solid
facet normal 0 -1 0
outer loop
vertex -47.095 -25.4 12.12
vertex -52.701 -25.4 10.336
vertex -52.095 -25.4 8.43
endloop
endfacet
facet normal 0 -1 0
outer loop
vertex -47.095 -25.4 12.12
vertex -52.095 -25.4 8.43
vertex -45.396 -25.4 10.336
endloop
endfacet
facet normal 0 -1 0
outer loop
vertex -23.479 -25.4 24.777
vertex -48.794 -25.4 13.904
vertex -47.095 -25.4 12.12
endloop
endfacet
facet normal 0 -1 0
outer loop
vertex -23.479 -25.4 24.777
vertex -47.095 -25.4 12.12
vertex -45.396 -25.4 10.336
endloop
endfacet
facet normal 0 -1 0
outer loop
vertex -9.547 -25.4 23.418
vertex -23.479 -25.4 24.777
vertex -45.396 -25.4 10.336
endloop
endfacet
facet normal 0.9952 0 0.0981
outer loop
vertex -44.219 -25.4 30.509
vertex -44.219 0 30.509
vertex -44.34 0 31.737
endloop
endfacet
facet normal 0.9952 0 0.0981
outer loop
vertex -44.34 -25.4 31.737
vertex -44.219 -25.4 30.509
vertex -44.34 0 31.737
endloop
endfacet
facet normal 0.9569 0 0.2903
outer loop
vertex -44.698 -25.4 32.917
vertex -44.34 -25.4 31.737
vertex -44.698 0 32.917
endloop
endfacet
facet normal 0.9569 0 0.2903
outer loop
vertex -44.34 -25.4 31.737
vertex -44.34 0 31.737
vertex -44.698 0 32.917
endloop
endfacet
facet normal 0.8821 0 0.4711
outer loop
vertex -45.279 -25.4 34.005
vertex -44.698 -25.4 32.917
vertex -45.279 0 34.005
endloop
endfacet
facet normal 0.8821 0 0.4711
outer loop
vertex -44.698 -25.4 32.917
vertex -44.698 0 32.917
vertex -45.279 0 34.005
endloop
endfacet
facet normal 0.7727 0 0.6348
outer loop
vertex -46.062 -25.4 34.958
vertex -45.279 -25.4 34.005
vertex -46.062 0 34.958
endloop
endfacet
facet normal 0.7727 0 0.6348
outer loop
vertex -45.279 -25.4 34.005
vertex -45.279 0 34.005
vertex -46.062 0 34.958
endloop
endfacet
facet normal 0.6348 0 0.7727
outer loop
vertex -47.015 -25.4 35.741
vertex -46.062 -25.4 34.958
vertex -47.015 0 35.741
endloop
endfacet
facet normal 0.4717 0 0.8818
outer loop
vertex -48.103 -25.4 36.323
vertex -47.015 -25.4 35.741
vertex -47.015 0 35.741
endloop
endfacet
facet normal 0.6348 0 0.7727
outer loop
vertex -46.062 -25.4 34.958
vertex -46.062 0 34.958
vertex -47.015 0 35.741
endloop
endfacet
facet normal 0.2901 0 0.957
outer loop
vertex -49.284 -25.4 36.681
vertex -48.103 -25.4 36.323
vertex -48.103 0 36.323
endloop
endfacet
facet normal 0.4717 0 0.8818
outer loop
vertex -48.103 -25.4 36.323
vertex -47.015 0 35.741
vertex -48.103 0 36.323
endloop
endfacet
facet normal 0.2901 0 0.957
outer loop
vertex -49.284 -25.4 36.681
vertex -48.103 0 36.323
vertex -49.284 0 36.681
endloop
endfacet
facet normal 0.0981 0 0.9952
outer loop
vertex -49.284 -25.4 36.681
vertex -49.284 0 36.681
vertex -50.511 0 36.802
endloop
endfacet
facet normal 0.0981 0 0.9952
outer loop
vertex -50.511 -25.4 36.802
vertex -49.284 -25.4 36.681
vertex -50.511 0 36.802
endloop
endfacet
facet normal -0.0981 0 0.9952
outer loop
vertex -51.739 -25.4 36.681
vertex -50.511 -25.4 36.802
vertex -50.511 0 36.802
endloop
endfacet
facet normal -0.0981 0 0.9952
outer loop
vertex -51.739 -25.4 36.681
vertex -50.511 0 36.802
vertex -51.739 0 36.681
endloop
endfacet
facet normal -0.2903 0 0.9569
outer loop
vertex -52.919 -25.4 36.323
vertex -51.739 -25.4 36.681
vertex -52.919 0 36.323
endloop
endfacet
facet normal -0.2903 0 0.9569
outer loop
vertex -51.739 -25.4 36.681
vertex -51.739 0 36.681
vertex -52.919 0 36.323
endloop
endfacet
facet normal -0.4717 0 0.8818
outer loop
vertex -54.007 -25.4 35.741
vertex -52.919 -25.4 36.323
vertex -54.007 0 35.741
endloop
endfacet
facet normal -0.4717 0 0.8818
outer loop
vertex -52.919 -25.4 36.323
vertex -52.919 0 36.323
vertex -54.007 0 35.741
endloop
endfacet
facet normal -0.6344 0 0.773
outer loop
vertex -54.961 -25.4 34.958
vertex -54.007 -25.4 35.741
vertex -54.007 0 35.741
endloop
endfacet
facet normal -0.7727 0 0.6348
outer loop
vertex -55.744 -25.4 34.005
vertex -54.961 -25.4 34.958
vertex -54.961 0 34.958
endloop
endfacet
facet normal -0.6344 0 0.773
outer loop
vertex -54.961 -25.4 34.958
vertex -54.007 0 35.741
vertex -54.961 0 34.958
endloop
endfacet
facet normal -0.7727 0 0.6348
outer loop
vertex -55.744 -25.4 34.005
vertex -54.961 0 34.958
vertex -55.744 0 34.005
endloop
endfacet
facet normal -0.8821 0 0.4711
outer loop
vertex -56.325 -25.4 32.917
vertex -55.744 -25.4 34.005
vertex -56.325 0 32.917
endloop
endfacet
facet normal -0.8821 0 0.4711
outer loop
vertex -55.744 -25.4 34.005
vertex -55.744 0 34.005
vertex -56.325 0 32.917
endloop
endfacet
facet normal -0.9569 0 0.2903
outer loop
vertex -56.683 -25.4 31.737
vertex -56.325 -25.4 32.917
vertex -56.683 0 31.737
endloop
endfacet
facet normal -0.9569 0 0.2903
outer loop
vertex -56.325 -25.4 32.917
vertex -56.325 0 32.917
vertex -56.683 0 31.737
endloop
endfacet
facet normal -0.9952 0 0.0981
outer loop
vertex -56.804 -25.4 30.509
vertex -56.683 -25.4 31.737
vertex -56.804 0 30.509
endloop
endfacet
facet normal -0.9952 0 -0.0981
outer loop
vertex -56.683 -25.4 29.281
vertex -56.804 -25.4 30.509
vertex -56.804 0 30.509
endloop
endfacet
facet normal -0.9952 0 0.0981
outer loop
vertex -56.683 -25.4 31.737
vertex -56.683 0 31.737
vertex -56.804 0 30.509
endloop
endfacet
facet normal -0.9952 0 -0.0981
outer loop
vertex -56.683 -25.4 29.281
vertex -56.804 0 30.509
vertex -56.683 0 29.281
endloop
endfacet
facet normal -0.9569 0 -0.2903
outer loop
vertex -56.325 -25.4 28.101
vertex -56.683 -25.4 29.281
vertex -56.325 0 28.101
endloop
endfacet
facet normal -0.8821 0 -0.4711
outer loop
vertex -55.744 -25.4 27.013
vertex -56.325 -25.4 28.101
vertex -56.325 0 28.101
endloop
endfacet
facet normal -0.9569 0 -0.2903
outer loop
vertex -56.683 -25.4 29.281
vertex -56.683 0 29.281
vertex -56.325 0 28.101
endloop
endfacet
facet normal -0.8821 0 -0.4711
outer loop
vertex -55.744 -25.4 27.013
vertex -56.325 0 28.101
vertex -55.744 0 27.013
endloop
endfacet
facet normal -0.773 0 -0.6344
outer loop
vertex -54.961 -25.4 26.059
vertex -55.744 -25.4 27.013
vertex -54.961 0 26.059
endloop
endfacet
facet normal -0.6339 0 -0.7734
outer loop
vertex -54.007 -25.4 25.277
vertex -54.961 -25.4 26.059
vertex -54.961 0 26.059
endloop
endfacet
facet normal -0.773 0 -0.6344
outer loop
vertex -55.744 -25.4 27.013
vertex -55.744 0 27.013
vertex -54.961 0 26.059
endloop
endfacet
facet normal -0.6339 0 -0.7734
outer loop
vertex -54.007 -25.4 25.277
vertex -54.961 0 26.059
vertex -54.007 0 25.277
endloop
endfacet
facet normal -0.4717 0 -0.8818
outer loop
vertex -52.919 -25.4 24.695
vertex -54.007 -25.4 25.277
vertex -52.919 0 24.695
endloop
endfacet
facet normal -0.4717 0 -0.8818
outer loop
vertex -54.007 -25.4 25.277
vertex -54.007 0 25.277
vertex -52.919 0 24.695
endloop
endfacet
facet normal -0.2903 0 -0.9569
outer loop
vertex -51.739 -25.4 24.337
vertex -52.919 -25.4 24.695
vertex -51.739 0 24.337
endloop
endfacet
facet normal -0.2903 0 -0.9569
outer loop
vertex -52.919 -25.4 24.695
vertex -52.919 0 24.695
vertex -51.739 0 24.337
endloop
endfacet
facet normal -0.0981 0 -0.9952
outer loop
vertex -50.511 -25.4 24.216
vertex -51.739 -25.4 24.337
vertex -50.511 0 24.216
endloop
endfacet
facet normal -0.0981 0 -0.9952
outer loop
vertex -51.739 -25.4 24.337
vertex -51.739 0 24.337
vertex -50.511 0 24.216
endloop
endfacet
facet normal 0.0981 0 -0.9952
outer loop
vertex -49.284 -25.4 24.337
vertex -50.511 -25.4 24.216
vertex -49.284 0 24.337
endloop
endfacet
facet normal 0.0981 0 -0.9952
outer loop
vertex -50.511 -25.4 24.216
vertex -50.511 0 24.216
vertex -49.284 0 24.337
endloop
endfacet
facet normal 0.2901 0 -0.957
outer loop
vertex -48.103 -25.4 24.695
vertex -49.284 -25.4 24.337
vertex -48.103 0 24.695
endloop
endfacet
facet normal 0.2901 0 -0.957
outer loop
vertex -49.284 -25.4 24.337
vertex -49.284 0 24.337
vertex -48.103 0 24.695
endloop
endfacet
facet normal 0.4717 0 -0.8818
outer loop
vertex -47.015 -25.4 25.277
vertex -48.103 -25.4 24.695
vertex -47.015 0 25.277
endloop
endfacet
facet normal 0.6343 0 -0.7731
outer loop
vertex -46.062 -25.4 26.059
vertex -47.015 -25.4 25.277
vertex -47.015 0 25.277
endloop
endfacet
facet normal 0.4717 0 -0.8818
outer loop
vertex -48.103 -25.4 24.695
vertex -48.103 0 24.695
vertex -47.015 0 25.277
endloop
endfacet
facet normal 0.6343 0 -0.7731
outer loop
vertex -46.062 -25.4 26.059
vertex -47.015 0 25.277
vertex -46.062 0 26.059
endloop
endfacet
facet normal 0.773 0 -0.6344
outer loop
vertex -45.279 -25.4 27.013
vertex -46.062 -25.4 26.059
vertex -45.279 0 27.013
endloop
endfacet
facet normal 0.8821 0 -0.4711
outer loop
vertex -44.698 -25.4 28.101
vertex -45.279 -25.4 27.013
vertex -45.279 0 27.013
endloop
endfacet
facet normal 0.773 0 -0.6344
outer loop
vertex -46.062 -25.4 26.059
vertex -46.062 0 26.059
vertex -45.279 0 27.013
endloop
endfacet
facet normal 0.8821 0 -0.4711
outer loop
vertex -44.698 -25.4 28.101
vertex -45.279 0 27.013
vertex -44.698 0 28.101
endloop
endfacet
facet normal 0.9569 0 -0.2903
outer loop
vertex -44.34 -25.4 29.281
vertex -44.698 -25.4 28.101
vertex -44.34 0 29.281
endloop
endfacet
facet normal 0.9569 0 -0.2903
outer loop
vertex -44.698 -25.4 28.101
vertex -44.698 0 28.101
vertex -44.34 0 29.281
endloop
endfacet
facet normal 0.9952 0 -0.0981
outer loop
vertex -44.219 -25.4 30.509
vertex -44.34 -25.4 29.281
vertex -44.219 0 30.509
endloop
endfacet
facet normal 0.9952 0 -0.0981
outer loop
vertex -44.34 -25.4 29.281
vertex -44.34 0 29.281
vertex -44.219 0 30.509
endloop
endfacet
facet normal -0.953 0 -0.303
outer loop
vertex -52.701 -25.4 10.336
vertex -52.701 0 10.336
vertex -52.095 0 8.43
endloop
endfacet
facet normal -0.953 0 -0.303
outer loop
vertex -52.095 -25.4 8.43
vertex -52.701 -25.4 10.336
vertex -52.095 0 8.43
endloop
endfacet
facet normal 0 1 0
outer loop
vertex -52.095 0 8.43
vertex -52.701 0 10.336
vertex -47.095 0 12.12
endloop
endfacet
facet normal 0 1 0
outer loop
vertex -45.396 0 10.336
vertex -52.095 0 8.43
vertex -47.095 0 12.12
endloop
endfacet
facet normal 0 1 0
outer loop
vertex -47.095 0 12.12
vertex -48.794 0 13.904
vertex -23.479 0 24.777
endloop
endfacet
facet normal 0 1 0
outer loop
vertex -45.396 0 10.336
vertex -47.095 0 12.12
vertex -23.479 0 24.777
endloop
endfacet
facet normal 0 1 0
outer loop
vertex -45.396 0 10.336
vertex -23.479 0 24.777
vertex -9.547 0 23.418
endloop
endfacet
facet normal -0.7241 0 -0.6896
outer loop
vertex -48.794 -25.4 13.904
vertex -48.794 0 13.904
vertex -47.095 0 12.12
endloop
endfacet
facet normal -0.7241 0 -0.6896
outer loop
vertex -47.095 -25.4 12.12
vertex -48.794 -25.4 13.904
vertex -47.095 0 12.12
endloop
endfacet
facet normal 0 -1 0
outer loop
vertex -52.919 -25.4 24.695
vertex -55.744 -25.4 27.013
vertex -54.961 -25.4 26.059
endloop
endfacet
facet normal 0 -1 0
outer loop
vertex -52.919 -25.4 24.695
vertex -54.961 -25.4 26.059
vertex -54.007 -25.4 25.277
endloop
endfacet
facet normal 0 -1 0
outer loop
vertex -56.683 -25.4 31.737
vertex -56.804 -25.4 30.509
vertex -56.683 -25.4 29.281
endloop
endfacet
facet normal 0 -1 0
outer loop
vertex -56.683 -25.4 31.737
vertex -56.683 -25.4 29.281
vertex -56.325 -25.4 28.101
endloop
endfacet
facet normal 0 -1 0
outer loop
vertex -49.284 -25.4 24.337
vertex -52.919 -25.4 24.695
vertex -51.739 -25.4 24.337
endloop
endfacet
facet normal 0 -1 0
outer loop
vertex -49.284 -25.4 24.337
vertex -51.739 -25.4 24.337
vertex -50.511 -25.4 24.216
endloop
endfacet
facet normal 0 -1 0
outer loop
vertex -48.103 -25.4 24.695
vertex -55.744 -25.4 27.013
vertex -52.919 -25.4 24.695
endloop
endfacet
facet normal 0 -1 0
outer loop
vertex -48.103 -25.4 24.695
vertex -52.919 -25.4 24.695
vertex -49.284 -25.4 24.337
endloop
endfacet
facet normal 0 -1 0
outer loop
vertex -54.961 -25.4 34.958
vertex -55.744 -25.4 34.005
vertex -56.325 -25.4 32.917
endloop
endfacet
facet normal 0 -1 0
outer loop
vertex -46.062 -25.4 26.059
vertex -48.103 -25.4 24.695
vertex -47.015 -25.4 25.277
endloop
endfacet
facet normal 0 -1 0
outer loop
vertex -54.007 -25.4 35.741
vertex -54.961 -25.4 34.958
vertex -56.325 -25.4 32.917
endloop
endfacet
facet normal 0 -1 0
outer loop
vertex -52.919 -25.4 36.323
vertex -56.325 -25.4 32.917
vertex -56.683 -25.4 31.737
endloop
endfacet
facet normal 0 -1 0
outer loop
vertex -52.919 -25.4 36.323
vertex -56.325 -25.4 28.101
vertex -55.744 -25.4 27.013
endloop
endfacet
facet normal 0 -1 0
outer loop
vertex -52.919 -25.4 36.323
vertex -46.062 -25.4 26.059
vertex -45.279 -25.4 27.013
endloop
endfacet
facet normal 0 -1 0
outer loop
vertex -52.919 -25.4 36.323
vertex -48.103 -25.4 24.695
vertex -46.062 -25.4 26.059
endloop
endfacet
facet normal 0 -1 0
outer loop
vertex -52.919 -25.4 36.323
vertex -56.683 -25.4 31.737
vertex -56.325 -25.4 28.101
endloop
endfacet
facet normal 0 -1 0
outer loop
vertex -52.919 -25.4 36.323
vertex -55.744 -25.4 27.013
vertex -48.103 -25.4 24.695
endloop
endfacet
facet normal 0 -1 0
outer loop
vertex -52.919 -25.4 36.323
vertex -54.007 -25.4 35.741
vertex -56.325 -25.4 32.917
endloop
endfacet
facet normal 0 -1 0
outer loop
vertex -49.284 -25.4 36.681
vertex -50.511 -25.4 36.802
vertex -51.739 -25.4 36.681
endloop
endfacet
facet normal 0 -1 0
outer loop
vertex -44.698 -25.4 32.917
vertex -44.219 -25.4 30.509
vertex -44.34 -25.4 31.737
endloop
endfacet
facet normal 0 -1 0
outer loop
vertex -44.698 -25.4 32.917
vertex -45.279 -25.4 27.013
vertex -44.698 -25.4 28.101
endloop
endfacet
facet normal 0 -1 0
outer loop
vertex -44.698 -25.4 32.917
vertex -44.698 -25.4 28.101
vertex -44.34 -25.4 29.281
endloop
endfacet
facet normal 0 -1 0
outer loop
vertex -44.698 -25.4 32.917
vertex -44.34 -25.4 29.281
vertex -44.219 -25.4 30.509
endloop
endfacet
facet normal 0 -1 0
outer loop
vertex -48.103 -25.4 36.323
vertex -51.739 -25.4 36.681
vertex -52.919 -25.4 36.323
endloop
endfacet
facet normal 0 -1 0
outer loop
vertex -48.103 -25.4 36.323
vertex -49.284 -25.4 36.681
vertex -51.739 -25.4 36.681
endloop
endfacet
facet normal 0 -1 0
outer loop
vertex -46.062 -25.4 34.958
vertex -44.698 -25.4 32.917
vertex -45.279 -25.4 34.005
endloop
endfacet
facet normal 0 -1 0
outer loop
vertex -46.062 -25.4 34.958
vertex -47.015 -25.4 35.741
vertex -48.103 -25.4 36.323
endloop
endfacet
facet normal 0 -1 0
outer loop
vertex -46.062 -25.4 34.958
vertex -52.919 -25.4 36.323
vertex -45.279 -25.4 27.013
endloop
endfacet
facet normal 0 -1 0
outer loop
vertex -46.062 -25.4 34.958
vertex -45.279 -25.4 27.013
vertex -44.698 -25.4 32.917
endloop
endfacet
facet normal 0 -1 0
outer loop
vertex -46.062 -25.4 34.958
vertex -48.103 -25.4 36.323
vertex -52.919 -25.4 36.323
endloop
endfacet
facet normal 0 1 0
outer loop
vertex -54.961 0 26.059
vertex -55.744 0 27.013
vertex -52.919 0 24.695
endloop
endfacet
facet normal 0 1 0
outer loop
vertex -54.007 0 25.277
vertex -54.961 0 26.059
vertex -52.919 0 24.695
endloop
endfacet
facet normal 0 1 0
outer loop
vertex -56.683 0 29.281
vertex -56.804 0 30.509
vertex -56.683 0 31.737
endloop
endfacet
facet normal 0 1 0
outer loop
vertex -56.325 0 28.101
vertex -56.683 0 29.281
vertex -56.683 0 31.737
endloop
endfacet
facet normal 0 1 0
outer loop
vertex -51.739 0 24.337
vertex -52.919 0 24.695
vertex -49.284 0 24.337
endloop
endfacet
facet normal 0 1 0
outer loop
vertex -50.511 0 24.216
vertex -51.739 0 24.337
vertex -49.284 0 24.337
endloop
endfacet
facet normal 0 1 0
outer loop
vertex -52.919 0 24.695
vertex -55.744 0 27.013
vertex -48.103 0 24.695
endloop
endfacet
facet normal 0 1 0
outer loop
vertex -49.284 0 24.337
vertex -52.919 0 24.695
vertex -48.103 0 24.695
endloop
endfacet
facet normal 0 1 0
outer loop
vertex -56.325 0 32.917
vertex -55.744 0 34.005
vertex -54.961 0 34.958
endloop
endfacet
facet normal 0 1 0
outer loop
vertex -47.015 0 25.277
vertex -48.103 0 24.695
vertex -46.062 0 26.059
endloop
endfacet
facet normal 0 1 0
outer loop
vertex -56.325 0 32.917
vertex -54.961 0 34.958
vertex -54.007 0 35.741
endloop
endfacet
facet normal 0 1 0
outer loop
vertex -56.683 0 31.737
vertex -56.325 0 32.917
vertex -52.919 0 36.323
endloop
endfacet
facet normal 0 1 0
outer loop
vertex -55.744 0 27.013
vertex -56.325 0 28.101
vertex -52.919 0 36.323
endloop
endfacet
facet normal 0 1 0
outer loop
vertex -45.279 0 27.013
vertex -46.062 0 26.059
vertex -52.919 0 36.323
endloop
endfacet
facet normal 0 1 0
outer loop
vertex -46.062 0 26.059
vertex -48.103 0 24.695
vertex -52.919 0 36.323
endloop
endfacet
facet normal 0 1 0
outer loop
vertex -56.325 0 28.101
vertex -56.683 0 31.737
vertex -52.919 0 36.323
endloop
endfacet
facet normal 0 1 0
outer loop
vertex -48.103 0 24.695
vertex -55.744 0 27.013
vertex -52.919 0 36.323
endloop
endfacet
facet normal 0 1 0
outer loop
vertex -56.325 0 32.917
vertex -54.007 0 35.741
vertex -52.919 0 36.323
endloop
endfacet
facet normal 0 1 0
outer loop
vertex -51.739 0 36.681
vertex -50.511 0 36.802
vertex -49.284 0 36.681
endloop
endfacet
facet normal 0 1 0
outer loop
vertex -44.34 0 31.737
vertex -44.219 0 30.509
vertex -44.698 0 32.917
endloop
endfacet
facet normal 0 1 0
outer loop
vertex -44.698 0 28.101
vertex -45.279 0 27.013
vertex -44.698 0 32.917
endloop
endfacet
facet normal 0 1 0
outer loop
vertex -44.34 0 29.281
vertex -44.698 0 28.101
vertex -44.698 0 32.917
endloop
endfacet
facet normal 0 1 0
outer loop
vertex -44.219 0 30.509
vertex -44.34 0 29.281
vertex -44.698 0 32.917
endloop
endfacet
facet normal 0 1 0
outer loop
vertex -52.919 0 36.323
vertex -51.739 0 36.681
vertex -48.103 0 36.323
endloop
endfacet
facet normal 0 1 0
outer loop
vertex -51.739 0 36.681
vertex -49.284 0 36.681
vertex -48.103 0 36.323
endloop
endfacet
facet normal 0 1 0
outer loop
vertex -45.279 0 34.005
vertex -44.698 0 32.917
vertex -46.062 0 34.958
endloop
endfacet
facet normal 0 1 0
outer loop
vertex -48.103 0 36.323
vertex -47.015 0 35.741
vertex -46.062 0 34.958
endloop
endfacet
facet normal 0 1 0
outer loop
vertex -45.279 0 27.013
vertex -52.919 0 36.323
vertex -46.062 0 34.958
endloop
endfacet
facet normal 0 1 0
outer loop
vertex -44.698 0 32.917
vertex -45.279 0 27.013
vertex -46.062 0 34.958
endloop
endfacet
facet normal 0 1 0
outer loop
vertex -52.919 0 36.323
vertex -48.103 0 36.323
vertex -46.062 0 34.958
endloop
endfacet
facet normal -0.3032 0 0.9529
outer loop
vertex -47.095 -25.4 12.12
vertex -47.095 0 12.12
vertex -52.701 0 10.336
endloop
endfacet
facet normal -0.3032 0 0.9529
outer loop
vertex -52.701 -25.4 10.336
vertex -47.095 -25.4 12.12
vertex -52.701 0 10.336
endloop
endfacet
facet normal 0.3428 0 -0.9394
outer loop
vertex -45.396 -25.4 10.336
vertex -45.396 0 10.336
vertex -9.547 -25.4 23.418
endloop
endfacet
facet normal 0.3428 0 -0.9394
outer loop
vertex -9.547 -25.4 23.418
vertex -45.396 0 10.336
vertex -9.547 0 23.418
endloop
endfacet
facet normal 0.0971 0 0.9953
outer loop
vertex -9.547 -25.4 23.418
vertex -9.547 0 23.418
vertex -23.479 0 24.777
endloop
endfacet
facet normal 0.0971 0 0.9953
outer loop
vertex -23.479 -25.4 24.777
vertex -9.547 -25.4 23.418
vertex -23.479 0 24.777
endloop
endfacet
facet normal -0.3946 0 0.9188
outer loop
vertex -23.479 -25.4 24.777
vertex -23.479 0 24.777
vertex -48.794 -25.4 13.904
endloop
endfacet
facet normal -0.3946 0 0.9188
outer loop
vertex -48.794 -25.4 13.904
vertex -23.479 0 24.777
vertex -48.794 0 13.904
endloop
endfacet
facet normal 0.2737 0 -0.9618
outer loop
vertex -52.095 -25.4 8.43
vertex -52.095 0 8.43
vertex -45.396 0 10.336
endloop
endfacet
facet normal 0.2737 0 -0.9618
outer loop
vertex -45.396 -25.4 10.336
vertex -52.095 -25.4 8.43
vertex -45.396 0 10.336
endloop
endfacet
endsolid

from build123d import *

# Parameters (mm, degrees)
F0_R     = 6.29267
F1_DEPTH = 25.4


with BuildPart() as f1:
    # F0 (on Front) → F1 (new body)
    with BuildSketch(Plane.XZ):
        with Locations((-50.511364, 30.508865)):
            Circle(F0_R)
        Polygon((-23.478651, 24.777239), (-48.793647, 13.903684), (-47.094654, 12.119742), (-45.395661, 10.335799), (-9.546909, 23.418047), align=None)
        Polygon((-45.395661, 10.335799), (-47.094654, 12.119742), (-52.701332, 10.335799), (-52.094783, 8.429503), align=None)
    extrude(amount=F1_DEPTH)


solid = f1.part
